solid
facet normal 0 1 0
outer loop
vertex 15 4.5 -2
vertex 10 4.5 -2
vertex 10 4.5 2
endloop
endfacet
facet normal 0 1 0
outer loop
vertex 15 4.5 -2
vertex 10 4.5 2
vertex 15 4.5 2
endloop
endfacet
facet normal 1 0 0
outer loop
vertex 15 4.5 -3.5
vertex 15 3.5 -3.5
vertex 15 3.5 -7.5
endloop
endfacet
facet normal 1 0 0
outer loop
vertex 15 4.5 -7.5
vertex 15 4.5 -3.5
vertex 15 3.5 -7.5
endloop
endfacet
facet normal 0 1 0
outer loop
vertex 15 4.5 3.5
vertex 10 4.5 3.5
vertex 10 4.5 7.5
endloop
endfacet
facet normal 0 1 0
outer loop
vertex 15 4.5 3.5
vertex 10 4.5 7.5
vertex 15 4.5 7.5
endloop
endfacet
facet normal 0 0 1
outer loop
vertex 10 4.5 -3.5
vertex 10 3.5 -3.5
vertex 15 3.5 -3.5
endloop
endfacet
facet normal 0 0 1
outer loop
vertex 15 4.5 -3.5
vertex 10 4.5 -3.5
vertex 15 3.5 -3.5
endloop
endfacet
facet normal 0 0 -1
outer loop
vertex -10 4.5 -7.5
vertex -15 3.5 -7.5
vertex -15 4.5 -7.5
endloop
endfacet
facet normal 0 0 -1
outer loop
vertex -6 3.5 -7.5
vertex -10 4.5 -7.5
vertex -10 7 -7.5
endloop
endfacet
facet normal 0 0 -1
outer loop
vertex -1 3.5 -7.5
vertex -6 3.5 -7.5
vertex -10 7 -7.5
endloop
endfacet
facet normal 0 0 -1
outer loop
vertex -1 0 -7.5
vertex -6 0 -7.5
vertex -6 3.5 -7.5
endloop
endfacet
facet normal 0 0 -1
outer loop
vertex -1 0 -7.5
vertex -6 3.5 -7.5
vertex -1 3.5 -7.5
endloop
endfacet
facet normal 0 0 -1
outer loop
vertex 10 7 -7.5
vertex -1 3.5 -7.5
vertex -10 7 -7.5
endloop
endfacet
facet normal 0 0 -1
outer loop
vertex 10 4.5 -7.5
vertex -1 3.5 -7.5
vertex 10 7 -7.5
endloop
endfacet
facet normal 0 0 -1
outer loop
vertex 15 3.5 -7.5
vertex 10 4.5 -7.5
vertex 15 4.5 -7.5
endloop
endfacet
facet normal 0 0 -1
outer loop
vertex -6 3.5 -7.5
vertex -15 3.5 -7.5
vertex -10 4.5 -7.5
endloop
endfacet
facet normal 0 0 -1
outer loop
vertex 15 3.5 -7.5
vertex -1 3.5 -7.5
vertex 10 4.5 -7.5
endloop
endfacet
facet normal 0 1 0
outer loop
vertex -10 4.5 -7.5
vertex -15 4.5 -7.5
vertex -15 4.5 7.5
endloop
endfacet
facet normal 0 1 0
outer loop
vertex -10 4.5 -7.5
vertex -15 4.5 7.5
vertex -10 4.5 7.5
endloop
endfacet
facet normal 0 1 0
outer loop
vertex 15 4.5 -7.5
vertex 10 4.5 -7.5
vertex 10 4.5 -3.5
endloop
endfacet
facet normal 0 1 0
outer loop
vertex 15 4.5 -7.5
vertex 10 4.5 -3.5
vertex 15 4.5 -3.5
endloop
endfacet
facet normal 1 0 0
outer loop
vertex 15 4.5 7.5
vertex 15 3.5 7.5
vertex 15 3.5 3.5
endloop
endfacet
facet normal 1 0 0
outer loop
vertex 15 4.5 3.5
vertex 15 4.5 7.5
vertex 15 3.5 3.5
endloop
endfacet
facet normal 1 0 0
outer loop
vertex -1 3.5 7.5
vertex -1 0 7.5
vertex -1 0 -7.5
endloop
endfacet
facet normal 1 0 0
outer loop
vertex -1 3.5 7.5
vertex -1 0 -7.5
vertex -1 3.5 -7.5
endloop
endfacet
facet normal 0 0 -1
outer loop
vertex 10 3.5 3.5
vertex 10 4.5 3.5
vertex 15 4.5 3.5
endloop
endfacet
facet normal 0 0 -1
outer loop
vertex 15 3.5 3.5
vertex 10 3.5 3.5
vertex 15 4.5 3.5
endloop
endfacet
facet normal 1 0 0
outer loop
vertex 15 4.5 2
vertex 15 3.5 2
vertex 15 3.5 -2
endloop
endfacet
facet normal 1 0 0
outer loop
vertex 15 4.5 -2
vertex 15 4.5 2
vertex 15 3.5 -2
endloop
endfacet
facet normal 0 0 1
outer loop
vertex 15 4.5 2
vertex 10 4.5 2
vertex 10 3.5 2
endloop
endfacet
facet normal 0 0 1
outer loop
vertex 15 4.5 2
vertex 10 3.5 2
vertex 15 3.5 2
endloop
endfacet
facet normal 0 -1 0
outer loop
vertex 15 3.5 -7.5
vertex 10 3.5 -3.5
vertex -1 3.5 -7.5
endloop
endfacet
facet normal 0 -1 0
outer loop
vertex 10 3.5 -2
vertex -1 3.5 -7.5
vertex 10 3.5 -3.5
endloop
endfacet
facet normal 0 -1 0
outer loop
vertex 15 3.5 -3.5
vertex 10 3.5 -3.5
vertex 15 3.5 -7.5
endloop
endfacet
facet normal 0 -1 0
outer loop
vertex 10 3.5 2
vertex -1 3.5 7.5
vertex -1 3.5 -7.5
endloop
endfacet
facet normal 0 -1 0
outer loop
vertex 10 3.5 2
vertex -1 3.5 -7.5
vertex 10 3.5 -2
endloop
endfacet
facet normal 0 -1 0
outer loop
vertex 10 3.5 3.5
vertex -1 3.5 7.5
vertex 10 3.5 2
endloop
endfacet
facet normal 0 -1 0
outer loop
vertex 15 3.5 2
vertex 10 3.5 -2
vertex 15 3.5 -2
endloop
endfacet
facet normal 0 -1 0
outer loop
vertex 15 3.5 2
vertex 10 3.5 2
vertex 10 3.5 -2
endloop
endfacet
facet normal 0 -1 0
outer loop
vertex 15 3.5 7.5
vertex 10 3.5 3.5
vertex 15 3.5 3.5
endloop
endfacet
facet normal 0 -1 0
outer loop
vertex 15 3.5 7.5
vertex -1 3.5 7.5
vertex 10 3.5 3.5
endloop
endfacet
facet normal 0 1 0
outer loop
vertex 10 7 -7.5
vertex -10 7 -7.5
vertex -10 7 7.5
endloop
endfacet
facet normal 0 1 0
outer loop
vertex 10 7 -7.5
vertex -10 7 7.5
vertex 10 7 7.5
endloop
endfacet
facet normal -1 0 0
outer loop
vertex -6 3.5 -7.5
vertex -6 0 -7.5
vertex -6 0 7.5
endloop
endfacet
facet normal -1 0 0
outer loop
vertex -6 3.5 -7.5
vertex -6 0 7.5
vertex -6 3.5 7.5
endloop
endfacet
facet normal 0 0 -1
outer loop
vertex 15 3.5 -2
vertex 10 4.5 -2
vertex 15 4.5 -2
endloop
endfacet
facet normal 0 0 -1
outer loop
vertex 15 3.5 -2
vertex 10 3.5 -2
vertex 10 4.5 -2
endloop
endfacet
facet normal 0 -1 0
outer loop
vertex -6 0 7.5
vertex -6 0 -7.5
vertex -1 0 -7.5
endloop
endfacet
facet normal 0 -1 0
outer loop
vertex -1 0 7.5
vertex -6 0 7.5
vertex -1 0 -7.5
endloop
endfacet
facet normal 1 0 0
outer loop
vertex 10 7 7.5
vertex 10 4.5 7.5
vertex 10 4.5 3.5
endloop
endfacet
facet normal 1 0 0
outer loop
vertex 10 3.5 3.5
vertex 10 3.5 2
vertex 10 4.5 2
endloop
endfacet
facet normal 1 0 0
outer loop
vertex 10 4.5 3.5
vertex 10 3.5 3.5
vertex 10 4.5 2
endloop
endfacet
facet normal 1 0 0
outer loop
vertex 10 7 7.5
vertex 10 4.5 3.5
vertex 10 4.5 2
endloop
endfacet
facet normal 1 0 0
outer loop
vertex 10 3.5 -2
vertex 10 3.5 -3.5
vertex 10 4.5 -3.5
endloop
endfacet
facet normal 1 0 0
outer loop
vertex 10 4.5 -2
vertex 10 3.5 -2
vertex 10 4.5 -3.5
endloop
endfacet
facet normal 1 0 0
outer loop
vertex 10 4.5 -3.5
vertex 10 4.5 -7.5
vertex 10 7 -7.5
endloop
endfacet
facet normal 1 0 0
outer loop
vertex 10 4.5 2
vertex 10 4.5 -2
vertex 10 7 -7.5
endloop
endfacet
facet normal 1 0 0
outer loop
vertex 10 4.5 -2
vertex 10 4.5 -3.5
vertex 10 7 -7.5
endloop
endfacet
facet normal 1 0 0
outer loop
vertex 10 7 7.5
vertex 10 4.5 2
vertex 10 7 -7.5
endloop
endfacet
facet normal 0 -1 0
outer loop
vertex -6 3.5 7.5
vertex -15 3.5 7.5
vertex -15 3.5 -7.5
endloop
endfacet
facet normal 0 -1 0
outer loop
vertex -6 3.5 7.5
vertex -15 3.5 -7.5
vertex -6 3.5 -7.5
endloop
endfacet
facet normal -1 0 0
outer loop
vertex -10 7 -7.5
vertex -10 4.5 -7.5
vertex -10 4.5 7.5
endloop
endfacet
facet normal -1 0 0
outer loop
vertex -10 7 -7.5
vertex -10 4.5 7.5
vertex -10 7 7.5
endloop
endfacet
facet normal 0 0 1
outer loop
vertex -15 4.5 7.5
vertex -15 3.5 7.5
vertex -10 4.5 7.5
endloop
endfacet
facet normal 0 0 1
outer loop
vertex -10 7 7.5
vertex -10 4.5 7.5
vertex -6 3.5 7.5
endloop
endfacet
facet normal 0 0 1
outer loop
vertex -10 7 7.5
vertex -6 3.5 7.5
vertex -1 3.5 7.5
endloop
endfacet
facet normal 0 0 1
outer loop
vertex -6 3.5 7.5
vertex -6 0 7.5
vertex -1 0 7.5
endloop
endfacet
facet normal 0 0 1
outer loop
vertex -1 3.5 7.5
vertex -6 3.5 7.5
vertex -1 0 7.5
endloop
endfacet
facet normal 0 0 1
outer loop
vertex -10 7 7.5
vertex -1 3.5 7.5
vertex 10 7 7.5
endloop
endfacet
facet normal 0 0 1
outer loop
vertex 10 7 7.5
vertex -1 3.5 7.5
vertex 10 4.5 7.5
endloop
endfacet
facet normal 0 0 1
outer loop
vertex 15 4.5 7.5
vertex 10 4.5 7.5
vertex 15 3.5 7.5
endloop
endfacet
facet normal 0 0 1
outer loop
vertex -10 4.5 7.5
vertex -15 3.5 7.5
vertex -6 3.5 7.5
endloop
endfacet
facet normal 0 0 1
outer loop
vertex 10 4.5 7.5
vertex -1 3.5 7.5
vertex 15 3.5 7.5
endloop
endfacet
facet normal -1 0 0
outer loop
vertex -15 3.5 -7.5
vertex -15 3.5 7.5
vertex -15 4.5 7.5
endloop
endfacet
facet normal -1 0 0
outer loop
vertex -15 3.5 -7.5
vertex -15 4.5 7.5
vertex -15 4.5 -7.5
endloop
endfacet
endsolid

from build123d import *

# Parameters (mm, degrees)
SKETCH1_W           = 30
SKETCH1_H           = 15
BOSS_EXTRUDE1_DEPTH = 7
SKETCH3_W           = 5
SKETCH3_H           = 2.5
SKETCH3_W_2         = 9
SKETCH3_H_2         = 3.5
SKETCH3_W_3         = 16
CUT_EXTRUDE1_DEPTH  = 18.5
SKETCH4_W           = 5
SKETCH4_H           = 1.5
CUT_EXTRUDE2_DEPTH  = 18.5


with BuildPart() as part:
    # Sketch1 → Boss-Extrude1 (new body)
    with BuildSketch(Plane(origin=(0, 0, 0), x_dir=(1, 0, 0), z_dir=(0, 1, 0))):
        Rectangle(SKETCH1_W, SKETCH1_H)
    extrude(amount=BOSS_EXTRUDE1_DEPTH)

    # Sketch3 → Cut-Extrude1 (cut, symmetric)
    with BuildSketch(Plane.XY.offset(7.5)):
        with Locations((-12.5, 5.75)):
            Rectangle(SKETCH3_W, SKETCH3_H)
        with Locations((-10.5, 1.75)):
            Rectangle(SKETCH3_W_2, SKETCH3_H_2)
        with Locations((12.5, 5.75)):
            Rectangle(SKETCH3_W, SKETCH3_H)
        with Locations((7, 1.75)):
            Rectangle(SKETCH3_W_3, SKETCH3_H_2)
    extrude(amount=CUT_EXTRUDE1_DEPTH, both=True, mode=Mode.SUBTRACT)

    # Sketch4 → Cut-Extrude2 (cut, symmetric)
    with BuildSketch(Plane(origin=(0, 7, 0), x_dir=(1, 0, 0), z_dir=(0, 1, 0))):
        with Locations((12.5, 2.75)):
            Rectangle(SKETCH4_W, SKETCH4_H)
        with Locations((12.5, -2.75)):
            Rectangle(SKETCH4_W, SKETCH4_H)
    extrude(amount=CUT_EXTRUDE2_DEPTH, both=True, mode=Mode.SUBTRACT)


solid = part.part
